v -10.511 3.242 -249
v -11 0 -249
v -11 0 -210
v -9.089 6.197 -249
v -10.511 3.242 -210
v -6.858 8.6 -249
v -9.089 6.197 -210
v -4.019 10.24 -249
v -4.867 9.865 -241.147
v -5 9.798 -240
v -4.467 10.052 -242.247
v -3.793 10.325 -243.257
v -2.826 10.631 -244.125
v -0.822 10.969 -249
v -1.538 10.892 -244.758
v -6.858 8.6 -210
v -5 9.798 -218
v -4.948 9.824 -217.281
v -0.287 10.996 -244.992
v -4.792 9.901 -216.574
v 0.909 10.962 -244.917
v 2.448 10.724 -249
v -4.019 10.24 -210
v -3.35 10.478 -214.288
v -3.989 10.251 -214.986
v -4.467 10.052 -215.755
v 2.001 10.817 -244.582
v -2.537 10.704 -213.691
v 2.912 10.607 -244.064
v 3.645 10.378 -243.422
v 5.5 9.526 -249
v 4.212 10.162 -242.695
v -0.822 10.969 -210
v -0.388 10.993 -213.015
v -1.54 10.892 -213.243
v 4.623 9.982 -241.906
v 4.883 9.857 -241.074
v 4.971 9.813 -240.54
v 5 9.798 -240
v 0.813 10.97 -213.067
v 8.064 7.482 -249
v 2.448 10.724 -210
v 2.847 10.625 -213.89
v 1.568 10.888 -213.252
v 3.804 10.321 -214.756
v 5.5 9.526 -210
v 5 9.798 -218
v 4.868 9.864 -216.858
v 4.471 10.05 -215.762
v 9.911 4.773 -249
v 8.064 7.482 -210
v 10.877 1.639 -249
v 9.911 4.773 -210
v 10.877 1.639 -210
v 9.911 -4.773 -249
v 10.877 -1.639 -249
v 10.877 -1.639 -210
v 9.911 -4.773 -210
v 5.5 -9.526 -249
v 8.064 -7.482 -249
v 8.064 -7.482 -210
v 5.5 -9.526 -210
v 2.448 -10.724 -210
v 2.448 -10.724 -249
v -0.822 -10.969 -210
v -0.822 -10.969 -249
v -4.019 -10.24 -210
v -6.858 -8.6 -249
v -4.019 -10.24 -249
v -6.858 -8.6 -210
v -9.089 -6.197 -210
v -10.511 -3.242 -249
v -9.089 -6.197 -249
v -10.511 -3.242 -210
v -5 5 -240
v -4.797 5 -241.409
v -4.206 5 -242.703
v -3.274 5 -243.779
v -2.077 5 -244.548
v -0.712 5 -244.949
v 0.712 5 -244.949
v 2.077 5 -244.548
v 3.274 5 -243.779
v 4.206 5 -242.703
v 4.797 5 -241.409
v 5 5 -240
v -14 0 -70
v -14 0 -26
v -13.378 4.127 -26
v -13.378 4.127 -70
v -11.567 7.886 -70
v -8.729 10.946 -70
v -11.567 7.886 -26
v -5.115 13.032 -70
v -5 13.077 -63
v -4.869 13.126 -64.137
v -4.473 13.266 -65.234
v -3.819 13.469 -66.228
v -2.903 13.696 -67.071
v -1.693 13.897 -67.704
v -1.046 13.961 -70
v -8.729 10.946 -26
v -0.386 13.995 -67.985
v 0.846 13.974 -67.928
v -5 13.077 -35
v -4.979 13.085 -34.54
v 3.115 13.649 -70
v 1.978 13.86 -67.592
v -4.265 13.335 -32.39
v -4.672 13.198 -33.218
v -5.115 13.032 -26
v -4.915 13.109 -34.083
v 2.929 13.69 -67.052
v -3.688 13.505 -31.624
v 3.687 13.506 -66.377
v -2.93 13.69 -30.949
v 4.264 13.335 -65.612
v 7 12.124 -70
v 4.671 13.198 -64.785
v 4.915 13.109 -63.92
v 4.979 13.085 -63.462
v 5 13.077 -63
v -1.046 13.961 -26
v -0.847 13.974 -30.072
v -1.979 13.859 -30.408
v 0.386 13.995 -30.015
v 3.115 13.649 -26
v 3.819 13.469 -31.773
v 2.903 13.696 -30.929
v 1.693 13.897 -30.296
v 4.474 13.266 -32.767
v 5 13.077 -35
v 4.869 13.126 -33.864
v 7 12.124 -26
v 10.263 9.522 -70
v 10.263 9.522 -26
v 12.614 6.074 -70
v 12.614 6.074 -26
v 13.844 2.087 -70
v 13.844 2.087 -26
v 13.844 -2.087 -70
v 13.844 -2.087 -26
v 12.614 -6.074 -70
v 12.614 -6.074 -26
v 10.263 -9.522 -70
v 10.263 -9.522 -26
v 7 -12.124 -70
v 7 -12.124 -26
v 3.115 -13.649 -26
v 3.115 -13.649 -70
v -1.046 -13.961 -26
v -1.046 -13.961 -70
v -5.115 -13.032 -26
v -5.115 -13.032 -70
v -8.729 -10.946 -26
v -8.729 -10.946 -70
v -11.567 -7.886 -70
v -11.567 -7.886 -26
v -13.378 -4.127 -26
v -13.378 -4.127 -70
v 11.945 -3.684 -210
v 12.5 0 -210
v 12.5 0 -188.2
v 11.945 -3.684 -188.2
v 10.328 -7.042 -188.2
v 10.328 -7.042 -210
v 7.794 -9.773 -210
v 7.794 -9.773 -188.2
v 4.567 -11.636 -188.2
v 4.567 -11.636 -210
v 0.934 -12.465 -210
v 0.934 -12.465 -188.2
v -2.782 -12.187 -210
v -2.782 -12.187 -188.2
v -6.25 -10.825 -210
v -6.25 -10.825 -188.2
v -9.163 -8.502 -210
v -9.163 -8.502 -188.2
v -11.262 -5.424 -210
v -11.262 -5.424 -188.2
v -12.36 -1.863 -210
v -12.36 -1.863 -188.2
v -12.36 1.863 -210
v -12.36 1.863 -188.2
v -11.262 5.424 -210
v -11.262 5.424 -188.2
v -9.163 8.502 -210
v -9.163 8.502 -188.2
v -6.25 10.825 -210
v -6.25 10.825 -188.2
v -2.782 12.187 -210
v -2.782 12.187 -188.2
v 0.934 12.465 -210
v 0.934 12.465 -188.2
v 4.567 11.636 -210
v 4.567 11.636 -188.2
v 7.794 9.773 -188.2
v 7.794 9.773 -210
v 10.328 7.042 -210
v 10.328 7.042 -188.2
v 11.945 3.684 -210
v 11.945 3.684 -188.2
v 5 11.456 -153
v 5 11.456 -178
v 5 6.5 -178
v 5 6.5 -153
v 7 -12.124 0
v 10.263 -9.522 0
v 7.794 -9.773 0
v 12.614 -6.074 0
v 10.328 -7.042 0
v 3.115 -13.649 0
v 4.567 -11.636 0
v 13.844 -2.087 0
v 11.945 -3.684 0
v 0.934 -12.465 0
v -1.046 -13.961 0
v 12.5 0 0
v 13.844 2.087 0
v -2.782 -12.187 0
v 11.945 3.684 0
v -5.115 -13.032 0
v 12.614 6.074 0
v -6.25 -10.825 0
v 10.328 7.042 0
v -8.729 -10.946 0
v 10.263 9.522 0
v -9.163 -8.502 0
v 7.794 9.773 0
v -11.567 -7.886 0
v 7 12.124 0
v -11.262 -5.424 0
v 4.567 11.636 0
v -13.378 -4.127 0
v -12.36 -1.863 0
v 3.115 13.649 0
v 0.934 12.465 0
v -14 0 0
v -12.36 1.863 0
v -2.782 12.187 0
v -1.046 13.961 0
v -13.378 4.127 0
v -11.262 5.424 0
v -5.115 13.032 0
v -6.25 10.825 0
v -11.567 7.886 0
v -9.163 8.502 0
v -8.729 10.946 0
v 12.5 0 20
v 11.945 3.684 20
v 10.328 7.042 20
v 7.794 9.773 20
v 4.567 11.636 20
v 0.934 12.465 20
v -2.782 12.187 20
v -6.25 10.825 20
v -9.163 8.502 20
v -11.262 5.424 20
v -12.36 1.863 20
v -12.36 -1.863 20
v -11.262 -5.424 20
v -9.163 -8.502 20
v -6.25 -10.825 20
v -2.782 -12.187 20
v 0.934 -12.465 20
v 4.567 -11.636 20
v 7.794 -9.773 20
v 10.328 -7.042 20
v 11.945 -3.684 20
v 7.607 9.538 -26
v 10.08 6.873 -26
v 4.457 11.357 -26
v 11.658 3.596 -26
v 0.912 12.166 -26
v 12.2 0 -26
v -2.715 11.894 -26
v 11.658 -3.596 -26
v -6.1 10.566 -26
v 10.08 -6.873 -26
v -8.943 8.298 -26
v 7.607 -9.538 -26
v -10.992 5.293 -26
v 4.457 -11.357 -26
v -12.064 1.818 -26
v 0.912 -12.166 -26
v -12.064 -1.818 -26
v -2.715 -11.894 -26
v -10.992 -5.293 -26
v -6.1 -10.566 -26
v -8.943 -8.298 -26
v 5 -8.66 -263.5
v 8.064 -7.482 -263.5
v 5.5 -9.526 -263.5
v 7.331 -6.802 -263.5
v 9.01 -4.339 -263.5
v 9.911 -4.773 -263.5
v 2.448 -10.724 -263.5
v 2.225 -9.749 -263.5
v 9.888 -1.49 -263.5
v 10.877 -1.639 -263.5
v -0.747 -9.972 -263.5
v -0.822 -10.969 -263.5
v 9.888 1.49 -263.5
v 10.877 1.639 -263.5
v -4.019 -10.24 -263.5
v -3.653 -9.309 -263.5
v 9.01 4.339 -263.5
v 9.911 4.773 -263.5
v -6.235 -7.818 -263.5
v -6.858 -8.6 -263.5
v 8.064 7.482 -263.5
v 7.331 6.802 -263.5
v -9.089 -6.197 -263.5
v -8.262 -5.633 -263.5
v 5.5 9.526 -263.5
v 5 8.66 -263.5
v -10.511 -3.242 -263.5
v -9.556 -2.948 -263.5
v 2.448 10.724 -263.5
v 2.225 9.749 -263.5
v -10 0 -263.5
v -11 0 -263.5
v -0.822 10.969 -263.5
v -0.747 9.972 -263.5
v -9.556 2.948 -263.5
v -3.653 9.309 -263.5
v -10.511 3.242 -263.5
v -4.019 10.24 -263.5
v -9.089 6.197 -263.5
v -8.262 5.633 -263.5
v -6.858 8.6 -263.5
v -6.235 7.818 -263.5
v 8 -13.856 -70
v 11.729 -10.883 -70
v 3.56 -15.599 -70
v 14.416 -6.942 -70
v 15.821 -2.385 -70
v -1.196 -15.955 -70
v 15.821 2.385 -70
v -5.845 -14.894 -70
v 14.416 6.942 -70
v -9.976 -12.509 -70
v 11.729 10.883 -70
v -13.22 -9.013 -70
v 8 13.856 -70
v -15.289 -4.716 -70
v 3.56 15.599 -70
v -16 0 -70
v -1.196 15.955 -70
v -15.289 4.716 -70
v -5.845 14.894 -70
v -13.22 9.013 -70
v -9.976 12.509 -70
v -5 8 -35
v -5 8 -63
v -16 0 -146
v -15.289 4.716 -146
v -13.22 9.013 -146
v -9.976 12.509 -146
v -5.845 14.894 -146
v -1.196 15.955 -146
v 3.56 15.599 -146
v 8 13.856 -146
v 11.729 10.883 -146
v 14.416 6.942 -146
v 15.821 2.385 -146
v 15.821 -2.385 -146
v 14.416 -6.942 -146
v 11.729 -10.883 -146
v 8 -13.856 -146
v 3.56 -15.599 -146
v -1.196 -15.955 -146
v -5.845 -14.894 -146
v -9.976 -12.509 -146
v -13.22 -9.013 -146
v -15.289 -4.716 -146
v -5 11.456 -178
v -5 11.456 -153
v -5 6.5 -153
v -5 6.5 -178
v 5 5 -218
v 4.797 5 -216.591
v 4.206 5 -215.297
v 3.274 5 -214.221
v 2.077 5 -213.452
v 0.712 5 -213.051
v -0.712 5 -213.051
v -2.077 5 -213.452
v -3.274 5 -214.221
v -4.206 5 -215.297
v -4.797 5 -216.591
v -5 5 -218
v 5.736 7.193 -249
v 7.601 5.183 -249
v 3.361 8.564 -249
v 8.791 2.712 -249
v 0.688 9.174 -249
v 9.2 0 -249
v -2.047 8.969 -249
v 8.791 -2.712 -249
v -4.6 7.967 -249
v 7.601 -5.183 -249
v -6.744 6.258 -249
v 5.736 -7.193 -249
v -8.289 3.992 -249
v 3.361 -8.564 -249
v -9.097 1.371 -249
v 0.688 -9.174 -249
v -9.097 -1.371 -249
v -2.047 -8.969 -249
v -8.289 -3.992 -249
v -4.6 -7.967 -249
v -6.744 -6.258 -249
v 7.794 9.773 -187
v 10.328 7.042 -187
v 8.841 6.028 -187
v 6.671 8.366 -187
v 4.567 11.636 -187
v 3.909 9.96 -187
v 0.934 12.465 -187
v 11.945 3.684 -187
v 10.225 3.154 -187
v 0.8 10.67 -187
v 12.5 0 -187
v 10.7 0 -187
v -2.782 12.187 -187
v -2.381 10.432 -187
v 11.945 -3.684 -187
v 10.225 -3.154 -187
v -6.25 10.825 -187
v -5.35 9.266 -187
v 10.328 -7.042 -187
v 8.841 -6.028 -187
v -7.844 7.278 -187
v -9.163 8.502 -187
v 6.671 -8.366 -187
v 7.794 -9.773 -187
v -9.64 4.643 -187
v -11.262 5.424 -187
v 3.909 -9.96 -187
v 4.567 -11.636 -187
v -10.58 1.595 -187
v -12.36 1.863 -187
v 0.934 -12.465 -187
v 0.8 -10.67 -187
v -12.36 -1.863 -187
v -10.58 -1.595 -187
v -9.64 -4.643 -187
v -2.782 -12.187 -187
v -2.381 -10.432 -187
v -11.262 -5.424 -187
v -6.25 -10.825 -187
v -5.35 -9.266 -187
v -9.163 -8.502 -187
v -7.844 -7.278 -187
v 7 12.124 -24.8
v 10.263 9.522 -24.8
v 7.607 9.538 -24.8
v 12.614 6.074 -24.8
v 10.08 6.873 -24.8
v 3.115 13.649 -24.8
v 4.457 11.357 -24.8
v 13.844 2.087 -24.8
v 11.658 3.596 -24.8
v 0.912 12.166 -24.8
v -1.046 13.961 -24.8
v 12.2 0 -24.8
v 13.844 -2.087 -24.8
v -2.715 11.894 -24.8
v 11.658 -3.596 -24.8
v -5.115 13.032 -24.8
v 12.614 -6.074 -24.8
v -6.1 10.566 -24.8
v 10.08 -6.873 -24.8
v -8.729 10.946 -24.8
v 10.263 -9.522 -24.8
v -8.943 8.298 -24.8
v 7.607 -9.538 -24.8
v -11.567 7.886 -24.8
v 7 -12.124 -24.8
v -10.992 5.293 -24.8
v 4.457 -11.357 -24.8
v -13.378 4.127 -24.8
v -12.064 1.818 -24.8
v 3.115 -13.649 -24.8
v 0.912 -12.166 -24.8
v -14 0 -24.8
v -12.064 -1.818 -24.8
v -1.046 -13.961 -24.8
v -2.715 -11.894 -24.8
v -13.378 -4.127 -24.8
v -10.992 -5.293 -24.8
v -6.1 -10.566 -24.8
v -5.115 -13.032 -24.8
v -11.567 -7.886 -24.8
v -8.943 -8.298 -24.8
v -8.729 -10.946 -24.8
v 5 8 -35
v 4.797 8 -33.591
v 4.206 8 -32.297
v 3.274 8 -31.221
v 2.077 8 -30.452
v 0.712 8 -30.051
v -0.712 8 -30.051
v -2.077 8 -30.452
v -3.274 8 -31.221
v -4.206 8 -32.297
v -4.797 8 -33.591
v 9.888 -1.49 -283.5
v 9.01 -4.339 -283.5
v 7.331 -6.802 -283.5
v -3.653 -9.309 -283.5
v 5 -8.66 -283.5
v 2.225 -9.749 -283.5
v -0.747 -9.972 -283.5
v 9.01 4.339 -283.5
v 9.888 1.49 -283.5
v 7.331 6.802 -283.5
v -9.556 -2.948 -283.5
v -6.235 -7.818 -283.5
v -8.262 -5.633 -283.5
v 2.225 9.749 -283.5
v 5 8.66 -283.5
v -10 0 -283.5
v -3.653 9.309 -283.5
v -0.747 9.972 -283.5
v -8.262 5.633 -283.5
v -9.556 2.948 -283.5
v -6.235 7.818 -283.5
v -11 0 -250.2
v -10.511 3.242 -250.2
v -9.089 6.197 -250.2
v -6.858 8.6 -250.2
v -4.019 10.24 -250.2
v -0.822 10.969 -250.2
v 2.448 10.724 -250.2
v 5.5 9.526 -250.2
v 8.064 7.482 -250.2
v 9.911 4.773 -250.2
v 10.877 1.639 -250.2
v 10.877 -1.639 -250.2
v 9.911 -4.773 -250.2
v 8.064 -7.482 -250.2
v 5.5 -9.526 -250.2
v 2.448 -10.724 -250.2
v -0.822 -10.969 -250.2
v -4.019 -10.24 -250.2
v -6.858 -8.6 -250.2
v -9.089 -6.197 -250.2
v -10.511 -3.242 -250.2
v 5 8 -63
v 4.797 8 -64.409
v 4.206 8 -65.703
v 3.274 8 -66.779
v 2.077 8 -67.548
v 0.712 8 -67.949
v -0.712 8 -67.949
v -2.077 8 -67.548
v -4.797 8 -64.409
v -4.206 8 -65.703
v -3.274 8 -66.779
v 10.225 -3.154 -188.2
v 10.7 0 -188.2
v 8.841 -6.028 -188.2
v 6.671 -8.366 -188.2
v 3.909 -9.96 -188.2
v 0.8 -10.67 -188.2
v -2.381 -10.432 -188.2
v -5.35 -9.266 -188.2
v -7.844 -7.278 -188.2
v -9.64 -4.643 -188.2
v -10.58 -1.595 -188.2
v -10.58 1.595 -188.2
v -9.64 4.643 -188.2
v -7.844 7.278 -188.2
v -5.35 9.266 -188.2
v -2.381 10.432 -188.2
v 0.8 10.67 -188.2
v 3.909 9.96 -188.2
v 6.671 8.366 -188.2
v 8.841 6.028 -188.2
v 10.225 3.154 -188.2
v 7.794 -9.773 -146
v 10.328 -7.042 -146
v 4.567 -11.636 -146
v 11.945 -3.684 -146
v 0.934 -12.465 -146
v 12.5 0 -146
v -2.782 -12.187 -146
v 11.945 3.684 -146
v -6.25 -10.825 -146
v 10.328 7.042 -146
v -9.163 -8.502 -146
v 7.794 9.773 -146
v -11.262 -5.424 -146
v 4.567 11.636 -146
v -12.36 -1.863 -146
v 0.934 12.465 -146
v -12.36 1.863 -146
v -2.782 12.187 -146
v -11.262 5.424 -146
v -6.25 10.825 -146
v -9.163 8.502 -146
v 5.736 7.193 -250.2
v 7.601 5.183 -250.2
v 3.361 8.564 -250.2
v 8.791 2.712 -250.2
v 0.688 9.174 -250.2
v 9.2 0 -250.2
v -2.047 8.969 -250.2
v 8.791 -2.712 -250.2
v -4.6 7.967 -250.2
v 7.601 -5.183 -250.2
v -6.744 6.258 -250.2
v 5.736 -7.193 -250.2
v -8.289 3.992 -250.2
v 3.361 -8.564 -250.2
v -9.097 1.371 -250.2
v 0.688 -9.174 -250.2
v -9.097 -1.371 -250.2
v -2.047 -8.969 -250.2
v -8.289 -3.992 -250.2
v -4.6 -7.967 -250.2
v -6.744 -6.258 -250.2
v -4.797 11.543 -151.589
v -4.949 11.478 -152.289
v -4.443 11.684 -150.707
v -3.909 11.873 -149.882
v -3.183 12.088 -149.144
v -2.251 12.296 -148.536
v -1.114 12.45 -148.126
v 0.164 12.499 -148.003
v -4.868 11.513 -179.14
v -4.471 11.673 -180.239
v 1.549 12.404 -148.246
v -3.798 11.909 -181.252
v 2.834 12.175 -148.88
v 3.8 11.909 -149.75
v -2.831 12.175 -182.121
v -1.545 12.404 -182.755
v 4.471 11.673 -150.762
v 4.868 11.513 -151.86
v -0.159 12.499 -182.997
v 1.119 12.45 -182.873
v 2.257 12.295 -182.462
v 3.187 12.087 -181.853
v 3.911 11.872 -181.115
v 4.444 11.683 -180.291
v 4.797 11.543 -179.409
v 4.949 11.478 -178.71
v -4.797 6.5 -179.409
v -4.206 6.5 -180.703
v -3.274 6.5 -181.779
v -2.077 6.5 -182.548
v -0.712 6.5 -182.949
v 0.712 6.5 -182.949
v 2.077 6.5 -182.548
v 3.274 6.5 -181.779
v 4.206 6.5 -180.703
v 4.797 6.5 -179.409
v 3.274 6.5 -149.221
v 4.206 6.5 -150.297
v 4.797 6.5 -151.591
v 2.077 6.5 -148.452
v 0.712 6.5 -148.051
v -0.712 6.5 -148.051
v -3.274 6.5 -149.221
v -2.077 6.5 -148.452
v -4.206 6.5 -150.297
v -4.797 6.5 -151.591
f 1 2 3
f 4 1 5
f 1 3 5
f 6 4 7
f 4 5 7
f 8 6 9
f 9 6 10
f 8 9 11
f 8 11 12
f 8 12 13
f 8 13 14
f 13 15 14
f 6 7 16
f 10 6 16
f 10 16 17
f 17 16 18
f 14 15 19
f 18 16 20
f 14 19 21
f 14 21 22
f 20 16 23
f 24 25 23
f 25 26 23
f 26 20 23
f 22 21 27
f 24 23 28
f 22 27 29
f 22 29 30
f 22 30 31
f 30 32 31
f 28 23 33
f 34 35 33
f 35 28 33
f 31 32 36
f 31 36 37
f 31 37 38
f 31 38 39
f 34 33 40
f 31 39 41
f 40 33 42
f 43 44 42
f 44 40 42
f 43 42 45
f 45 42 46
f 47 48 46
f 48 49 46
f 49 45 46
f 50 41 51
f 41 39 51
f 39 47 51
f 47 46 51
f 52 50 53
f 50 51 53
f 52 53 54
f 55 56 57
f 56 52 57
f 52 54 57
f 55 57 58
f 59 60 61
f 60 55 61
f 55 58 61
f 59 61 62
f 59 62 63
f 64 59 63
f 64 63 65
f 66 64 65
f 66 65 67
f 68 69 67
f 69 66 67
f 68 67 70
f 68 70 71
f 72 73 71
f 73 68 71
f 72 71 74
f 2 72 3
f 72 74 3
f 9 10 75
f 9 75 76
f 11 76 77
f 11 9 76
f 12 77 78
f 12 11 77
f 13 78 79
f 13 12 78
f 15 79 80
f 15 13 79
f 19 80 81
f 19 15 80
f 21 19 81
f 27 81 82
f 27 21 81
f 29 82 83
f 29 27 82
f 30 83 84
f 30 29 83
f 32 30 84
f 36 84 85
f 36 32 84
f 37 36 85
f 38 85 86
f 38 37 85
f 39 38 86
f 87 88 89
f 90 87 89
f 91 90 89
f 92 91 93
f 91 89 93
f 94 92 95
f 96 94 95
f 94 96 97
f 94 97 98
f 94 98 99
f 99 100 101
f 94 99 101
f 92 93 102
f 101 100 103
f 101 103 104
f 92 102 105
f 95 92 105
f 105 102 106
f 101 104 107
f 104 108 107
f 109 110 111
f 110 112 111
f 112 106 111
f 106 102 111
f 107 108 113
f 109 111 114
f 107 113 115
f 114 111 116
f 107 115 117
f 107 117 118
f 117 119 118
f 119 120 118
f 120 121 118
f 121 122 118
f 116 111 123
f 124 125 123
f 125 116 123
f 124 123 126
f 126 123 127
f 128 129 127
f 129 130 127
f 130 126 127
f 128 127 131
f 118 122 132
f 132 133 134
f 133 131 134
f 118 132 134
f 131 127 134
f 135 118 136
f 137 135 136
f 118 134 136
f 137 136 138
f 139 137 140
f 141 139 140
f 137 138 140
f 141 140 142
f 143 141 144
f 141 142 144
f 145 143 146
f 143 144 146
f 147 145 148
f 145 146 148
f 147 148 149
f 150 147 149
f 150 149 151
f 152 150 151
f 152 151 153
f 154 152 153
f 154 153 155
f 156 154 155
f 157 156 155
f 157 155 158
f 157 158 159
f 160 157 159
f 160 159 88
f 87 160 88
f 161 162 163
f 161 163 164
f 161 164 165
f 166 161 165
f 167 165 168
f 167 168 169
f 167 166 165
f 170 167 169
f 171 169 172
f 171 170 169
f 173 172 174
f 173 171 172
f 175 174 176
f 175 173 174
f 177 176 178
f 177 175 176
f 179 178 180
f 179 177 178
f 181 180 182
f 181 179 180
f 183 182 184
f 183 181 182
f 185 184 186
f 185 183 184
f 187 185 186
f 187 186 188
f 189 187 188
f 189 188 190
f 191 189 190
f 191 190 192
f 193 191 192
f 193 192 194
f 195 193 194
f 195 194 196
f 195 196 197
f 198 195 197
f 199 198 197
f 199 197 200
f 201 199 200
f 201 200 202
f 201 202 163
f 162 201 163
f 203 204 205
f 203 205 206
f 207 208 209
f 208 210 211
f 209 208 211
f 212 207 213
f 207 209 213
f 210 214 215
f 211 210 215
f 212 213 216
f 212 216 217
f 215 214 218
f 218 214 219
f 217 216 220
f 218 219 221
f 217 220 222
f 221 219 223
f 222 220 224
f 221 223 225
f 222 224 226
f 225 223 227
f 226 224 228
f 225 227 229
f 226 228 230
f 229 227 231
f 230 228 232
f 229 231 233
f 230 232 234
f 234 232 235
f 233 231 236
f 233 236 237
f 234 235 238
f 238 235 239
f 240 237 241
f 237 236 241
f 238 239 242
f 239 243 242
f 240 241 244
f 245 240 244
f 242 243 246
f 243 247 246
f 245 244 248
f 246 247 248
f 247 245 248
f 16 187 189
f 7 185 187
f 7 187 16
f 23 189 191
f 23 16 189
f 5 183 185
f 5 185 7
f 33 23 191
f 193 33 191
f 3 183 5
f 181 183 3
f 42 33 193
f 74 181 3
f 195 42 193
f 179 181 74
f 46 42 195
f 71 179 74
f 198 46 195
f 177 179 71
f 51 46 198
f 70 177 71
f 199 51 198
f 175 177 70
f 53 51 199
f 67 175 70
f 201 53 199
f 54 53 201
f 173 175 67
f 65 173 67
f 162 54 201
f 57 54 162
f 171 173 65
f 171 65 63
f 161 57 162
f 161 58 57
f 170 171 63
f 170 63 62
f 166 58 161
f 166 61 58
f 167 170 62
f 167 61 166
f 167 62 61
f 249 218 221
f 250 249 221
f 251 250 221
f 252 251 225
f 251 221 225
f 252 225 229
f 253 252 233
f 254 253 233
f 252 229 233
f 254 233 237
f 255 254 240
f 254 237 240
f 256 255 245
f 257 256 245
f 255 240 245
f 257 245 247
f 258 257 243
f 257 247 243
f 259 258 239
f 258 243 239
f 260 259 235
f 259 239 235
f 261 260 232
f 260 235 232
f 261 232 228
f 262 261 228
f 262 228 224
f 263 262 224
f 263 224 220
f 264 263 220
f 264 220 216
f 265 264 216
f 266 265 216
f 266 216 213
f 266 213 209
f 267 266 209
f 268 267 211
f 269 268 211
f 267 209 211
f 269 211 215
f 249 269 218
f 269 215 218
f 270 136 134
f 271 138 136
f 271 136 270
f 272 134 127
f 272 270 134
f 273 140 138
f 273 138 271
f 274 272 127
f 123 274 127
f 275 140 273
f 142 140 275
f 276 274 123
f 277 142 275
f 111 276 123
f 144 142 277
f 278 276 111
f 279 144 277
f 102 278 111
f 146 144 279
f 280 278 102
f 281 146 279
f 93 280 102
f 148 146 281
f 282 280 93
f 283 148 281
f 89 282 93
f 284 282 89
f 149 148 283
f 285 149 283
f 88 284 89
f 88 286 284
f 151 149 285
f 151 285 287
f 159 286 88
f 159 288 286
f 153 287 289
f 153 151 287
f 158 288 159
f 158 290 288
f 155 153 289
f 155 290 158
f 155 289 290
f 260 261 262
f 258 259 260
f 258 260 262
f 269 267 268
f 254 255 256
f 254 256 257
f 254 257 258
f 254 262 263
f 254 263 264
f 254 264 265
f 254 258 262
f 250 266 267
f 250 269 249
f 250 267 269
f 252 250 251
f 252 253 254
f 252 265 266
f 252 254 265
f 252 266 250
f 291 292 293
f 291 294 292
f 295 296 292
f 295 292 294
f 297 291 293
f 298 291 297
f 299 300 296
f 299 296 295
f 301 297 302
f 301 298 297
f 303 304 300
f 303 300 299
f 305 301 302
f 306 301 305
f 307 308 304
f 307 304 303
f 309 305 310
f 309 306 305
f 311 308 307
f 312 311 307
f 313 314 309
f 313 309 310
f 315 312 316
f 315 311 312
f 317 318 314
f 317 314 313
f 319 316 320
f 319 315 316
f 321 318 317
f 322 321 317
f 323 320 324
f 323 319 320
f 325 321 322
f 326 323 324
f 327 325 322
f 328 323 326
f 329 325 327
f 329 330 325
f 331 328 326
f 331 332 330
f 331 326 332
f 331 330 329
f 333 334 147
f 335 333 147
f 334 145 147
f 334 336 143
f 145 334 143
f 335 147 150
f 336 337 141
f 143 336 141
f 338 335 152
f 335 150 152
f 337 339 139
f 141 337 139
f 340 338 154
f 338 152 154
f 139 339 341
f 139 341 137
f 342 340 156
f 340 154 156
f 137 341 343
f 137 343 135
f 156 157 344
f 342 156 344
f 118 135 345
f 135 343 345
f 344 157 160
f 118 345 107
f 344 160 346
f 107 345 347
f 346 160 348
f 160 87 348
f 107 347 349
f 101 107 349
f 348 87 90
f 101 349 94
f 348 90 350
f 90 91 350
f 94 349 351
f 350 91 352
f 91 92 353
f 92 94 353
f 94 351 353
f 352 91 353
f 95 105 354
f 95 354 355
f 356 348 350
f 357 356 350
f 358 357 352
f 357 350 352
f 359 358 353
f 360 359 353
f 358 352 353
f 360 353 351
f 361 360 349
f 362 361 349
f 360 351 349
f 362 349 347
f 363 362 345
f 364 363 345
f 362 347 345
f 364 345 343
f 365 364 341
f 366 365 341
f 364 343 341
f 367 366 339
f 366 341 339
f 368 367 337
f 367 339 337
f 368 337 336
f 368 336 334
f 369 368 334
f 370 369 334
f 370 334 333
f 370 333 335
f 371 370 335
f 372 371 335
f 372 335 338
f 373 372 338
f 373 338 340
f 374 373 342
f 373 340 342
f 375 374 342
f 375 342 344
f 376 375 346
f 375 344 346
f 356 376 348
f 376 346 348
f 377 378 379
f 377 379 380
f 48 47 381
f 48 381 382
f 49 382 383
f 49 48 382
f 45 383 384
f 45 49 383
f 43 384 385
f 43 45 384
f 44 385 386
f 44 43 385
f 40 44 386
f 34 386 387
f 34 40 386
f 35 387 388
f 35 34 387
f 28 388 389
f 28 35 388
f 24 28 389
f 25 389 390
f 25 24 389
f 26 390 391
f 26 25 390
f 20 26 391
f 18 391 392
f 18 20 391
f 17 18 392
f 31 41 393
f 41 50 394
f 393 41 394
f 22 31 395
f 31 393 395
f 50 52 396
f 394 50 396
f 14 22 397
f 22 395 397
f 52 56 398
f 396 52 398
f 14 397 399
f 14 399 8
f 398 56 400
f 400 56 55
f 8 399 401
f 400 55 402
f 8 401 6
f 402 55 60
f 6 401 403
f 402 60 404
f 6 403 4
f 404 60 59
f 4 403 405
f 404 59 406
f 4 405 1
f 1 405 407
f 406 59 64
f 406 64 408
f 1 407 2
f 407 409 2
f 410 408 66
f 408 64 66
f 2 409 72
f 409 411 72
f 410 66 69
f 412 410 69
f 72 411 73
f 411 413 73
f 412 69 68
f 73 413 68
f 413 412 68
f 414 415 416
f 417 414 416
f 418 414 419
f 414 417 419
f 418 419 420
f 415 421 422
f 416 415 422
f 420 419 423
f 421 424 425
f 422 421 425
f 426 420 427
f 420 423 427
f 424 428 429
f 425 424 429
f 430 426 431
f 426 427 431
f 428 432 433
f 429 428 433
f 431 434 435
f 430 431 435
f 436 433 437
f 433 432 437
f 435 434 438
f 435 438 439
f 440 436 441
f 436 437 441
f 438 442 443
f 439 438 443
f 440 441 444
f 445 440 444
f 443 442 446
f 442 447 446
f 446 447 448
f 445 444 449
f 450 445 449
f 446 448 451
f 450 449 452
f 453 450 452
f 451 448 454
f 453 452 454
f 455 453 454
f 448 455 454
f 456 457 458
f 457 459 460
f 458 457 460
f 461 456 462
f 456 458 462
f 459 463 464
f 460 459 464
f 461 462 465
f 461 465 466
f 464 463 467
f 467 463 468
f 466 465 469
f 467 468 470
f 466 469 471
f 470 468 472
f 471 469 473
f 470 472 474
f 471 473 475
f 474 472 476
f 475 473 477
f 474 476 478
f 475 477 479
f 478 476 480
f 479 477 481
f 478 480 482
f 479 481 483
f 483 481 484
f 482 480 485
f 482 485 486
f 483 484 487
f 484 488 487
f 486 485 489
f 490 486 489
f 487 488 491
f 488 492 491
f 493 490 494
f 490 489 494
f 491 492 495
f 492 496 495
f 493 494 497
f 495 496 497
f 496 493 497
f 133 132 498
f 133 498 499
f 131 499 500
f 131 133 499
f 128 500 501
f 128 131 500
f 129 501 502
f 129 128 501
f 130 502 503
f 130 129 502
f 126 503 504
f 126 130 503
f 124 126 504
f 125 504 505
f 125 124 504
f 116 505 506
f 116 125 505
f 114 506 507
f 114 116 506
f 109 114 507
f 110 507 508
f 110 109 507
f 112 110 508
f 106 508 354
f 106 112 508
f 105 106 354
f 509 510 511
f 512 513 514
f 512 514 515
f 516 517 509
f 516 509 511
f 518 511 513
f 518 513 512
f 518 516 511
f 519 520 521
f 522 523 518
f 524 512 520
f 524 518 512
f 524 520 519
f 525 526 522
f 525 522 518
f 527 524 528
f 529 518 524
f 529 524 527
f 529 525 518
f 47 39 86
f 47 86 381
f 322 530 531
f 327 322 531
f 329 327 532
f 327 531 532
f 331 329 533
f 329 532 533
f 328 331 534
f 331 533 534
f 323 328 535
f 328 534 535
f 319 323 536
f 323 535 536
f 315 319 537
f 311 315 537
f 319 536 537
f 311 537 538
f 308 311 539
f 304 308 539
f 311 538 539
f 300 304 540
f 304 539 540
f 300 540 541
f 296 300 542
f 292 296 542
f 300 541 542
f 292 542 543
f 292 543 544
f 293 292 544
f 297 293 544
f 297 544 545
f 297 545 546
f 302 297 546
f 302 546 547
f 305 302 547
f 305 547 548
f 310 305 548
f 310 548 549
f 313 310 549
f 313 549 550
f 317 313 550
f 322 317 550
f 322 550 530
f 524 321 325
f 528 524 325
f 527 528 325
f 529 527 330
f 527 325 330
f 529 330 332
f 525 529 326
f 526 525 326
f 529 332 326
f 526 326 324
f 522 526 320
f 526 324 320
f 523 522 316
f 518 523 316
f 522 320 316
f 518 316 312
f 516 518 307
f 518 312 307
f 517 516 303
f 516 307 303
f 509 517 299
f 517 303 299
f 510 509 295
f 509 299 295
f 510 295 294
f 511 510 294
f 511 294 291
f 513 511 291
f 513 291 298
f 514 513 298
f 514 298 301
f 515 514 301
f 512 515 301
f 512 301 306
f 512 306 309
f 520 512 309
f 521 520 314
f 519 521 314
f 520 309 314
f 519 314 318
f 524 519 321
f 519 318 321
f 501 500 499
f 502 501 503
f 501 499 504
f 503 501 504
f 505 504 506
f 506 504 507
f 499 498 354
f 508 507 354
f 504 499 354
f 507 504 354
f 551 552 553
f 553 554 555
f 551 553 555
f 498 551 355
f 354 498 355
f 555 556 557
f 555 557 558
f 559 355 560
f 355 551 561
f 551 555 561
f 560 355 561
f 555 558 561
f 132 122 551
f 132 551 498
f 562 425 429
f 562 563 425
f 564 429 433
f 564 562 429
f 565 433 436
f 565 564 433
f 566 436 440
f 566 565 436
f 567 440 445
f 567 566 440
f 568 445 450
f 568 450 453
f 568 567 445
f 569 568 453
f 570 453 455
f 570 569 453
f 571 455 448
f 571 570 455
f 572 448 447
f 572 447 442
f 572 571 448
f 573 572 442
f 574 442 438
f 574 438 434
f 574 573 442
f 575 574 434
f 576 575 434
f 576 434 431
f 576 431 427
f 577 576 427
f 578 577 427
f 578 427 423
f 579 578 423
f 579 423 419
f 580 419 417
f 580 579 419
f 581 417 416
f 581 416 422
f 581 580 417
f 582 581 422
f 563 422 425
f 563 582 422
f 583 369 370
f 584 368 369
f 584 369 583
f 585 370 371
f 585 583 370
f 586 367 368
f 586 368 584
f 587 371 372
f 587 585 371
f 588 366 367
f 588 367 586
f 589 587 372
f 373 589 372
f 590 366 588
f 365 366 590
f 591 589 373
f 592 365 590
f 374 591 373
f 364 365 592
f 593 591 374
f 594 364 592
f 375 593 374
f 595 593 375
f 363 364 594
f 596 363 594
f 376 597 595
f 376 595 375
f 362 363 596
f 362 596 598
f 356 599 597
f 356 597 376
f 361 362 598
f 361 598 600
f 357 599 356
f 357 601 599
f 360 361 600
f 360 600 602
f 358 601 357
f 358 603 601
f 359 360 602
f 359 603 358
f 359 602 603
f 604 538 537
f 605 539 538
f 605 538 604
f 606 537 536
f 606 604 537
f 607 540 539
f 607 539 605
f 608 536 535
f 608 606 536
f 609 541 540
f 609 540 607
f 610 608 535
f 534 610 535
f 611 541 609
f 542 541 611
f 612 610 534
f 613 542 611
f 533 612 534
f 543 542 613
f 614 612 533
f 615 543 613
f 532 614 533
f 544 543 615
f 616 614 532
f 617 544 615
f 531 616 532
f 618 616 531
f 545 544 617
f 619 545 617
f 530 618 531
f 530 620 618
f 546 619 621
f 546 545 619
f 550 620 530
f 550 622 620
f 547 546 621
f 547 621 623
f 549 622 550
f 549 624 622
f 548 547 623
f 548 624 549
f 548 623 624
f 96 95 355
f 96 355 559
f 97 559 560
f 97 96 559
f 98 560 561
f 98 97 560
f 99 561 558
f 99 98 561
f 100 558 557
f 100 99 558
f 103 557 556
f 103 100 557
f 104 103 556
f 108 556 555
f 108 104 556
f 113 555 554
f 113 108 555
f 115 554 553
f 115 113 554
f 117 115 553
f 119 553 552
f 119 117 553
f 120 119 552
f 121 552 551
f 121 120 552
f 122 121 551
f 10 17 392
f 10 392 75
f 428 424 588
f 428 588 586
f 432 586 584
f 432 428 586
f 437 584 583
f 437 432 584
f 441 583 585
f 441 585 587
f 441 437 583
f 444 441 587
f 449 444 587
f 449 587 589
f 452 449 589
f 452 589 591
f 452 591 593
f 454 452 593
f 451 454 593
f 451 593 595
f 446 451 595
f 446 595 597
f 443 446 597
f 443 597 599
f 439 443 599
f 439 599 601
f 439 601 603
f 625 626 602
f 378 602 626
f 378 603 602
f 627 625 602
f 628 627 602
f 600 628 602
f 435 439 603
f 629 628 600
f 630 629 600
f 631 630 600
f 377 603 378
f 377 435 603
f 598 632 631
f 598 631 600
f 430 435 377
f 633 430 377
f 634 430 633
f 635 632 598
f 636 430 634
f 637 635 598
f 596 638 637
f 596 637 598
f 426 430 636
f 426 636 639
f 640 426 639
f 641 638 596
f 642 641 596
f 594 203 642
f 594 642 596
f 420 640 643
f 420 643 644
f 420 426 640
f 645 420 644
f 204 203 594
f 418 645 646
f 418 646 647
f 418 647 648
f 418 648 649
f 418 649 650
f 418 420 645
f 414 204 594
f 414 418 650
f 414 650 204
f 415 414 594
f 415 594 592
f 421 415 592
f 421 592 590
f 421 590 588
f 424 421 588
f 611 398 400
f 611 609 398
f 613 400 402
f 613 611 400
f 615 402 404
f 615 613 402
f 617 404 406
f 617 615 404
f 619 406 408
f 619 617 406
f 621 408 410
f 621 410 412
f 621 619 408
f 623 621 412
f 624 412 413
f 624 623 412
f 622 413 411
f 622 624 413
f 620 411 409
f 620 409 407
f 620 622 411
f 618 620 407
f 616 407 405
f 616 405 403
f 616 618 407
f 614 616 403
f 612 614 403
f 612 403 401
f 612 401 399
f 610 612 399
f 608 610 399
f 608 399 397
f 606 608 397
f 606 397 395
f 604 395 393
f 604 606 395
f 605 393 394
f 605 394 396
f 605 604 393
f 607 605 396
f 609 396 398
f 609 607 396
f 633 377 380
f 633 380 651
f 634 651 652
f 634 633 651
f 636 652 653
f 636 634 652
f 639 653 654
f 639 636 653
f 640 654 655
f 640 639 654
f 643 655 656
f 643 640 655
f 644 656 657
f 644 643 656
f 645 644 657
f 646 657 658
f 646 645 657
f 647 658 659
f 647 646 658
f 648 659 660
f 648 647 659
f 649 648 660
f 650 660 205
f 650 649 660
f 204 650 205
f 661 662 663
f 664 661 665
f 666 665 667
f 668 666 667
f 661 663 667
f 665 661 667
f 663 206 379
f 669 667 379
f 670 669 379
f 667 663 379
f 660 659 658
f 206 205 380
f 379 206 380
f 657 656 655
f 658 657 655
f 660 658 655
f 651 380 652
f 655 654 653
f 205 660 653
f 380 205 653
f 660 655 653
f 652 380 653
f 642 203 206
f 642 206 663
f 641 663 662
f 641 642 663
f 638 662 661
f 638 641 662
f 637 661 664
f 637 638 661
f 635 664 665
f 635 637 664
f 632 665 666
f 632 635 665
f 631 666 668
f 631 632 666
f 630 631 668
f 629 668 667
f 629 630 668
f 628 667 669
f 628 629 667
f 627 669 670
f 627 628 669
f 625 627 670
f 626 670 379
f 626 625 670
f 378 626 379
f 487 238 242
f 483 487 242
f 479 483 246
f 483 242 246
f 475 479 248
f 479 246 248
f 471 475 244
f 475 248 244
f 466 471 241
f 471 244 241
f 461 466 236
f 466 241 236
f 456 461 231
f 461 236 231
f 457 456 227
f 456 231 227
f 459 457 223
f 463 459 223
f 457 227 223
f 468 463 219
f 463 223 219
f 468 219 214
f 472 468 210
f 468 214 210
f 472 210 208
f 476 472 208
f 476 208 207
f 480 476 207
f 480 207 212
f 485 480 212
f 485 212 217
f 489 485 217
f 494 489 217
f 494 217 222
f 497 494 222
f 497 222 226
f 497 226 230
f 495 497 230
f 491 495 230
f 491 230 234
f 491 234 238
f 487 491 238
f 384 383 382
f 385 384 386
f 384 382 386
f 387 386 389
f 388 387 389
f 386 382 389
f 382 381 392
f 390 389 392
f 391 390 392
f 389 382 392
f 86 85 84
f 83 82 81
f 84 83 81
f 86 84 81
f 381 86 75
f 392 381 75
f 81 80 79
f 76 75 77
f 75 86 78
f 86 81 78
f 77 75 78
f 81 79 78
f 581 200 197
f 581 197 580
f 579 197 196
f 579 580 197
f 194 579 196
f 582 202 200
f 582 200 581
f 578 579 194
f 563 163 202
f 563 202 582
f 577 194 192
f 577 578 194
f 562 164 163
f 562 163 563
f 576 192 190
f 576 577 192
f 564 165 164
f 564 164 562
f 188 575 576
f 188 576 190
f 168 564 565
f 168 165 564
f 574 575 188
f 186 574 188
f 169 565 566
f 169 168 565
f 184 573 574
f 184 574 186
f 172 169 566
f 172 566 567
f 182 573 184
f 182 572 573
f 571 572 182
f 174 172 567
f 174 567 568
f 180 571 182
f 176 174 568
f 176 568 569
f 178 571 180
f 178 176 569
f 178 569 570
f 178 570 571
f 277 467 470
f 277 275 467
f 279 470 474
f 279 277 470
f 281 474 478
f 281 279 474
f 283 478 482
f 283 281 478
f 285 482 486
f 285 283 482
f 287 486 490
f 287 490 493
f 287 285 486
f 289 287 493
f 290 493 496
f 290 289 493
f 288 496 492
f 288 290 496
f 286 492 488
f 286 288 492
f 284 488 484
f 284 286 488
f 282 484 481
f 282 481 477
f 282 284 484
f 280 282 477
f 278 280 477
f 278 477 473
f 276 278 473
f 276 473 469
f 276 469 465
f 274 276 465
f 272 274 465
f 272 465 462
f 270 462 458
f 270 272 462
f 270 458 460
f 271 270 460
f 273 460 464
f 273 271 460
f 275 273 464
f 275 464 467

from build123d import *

# Parameters (mm, degrees)
SKETCH2_R           = 12.5
BOSS_EXTRUDE1_DEPTH = 20
SKETCH3_R           = 14
BOSS_EXTRUDE2_DEPTH = 70
SKETCH4_R           = 16
BOSS_EXTRUDE3_DEPTH = 76
BOSS_EXTRUDE4_START = 64
SKETCH5_R           = 12.5
BOSS_EXTRUDE4_DEPTH = 64
SKETCH6_R           = 11
BOSS_EXTRUDE5_DEPTH = 53.5
SKETCH7_R           = 10
BOSS_EXTRUDE6_DEPTH = 20
CUT_EXTRUDE1_DEPTH  = 6
CUT_EXTRUDE2_DEPTH  = 6
CUT_EXTRUDE3_DEPTH  = 6
SKETCH12_W          = 1.2
SKETCH12_H          = 1.8


with BuildPart() as part:
    # Sketch2 → Boss-Extrude1 (new body)
    with BuildSketch(Plane.XY):
        Circle(SKETCH2_R)
    extrude(amount=BOSS_EXTRUDE1_DEPTH)

    # Sketch3 → Boss-Extrude2 (add)
    with BuildSketch(Plane(origin=(0, 0, 0), x_dir=(-1, 0, 0), z_dir=(0, 0, -1))):
        Circle(SKETCH3_R)
    extrude(amount=BOSS_EXTRUDE2_DEPTH)

    # Sketch4 → Boss-Extrude3 (add)
    with BuildSketch(Plane(origin=(0, 0, -70), x_dir=(-1, 0, 0), z_dir=(0, 0, -1))):
        Circle(SKETCH4_R)
    extrude(amount=BOSS_EXTRUDE3_DEPTH)

    # Sketch5 → Boss-Extrude4 (add)
    with BuildSketch(Plane(origin=(0, 0, -146), x_dir=(-1, 0, 0), z_dir=(0, 0, -1)).offset(BOSS_EXTRUDE4_START)):
        with Locations(Location((0, 0, 0), (0, 0, 180))):
            Circle(SKETCH5_R)
    extrude(amount=-BOSS_EXTRUDE4_DEPTH)

    # Sketch6 → Boss-Extrude5 (add)
    with BuildSketch(Plane(origin=(0, 0, -210), x_dir=(-1, 0, 0), z_dir=(0, 0, -1))):
        Circle(SKETCH6_R)
    extrude(amount=BOSS_EXTRUDE5_DEPTH)

    # Sketch7 → Boss-Extrude6 (add)
    with BuildSketch(Plane(origin=(0, 0, -263.5), x_dir=(-1, 0, 0), z_dir=(0, 0, -1))):
        Circle(SKETCH7_R)
    extrude(amount=BOSS_EXTRUDE6_DEPTH)

    # Sketch8 → Cut-Extrude1 (cut)
    with BuildSketch(Plane(origin=(0, 14, 0), x_dir=(1, 0, 0), z_dir=(0, 1, 0))):
        with BuildLine():
            Line((5, 63), (5, 35))
            ThreePointArc((5, 35), (0, 30), (-5, 35))
            Line((-5, 35), (-5, 63))
            ThreePointArc((-5, 63), (0, 68), (5, 63))
        make_face()
    extrude(amount=-CUT_EXTRUDE1_DEPTH, mode=Mode.SUBTRACT)

    # Sketch9 → Cut-Extrude2 (cut)
    with BuildSketch(Plane(origin=(0, 12.5, 0), x_dir=(1, 0, 0), z_dir=(0, 1, 0))):
        with BuildLine():
            Line((-5, 153), (-5, 178))
            ThreePointArc((-5, 178), (0, 183), (5, 178))
            Line((5, 178), (5, 153))
            ThreePointArc((5, 153), (0, 148), (-5, 153))
        make_face()
    extrude(amount=-CUT_EXTRUDE2_DEPTH, mode=Mode.SUBTRACT)

    # Sketch11 → Cut-Extrude3 (cut)
    with BuildSketch(Plane(origin=(0, 11, 0), x_dir=(1, 0, 0), z_dir=(0, 1, 0))):
        with BuildLine():
            Line((-5, 218), (-5, 240))
            ThreePointArc((-5, 240), (0, 245), (5, 240))
            Line((5, 240), (5, 218))
            ThreePointArc((5, 218), (0, 213), (-5, 218))
        make_face()
    extrude(amount=-CUT_EXTRUDE3_DEPTH, mode=Mode.SUBTRACT)

    # Sketch12 → Cut-Revolve1 (revolve, cut)
    with BuildSketch(Plane(origin=(0, 0, 0), x_dir=(0, 0, -1), z_dir=(1, 0, 0)), mode=Mode.PRIVATE) as cut_revolve1_sk:
        with Locations((25.4, 13.1)):
            Rectangle(SKETCH12_W, SKETCH12_H)
        with Locations((187.6, 11.6)):
            Rectangle(SKETCH12_W, SKETCH12_H)
        with Locations((249.6, 10.1)):
            Rectangle(SKETCH12_W, SKETCH12_H)
    revolve(cut_revolve1_sk.sketch.rotate(Axis((0, 0, 20.679207299), (0, 0, -1)), 90), axis=Axis((0, 0, 20.679207299), (0, 0, -1)), mode=Mode.SUBTRACT)


solid = part.part
